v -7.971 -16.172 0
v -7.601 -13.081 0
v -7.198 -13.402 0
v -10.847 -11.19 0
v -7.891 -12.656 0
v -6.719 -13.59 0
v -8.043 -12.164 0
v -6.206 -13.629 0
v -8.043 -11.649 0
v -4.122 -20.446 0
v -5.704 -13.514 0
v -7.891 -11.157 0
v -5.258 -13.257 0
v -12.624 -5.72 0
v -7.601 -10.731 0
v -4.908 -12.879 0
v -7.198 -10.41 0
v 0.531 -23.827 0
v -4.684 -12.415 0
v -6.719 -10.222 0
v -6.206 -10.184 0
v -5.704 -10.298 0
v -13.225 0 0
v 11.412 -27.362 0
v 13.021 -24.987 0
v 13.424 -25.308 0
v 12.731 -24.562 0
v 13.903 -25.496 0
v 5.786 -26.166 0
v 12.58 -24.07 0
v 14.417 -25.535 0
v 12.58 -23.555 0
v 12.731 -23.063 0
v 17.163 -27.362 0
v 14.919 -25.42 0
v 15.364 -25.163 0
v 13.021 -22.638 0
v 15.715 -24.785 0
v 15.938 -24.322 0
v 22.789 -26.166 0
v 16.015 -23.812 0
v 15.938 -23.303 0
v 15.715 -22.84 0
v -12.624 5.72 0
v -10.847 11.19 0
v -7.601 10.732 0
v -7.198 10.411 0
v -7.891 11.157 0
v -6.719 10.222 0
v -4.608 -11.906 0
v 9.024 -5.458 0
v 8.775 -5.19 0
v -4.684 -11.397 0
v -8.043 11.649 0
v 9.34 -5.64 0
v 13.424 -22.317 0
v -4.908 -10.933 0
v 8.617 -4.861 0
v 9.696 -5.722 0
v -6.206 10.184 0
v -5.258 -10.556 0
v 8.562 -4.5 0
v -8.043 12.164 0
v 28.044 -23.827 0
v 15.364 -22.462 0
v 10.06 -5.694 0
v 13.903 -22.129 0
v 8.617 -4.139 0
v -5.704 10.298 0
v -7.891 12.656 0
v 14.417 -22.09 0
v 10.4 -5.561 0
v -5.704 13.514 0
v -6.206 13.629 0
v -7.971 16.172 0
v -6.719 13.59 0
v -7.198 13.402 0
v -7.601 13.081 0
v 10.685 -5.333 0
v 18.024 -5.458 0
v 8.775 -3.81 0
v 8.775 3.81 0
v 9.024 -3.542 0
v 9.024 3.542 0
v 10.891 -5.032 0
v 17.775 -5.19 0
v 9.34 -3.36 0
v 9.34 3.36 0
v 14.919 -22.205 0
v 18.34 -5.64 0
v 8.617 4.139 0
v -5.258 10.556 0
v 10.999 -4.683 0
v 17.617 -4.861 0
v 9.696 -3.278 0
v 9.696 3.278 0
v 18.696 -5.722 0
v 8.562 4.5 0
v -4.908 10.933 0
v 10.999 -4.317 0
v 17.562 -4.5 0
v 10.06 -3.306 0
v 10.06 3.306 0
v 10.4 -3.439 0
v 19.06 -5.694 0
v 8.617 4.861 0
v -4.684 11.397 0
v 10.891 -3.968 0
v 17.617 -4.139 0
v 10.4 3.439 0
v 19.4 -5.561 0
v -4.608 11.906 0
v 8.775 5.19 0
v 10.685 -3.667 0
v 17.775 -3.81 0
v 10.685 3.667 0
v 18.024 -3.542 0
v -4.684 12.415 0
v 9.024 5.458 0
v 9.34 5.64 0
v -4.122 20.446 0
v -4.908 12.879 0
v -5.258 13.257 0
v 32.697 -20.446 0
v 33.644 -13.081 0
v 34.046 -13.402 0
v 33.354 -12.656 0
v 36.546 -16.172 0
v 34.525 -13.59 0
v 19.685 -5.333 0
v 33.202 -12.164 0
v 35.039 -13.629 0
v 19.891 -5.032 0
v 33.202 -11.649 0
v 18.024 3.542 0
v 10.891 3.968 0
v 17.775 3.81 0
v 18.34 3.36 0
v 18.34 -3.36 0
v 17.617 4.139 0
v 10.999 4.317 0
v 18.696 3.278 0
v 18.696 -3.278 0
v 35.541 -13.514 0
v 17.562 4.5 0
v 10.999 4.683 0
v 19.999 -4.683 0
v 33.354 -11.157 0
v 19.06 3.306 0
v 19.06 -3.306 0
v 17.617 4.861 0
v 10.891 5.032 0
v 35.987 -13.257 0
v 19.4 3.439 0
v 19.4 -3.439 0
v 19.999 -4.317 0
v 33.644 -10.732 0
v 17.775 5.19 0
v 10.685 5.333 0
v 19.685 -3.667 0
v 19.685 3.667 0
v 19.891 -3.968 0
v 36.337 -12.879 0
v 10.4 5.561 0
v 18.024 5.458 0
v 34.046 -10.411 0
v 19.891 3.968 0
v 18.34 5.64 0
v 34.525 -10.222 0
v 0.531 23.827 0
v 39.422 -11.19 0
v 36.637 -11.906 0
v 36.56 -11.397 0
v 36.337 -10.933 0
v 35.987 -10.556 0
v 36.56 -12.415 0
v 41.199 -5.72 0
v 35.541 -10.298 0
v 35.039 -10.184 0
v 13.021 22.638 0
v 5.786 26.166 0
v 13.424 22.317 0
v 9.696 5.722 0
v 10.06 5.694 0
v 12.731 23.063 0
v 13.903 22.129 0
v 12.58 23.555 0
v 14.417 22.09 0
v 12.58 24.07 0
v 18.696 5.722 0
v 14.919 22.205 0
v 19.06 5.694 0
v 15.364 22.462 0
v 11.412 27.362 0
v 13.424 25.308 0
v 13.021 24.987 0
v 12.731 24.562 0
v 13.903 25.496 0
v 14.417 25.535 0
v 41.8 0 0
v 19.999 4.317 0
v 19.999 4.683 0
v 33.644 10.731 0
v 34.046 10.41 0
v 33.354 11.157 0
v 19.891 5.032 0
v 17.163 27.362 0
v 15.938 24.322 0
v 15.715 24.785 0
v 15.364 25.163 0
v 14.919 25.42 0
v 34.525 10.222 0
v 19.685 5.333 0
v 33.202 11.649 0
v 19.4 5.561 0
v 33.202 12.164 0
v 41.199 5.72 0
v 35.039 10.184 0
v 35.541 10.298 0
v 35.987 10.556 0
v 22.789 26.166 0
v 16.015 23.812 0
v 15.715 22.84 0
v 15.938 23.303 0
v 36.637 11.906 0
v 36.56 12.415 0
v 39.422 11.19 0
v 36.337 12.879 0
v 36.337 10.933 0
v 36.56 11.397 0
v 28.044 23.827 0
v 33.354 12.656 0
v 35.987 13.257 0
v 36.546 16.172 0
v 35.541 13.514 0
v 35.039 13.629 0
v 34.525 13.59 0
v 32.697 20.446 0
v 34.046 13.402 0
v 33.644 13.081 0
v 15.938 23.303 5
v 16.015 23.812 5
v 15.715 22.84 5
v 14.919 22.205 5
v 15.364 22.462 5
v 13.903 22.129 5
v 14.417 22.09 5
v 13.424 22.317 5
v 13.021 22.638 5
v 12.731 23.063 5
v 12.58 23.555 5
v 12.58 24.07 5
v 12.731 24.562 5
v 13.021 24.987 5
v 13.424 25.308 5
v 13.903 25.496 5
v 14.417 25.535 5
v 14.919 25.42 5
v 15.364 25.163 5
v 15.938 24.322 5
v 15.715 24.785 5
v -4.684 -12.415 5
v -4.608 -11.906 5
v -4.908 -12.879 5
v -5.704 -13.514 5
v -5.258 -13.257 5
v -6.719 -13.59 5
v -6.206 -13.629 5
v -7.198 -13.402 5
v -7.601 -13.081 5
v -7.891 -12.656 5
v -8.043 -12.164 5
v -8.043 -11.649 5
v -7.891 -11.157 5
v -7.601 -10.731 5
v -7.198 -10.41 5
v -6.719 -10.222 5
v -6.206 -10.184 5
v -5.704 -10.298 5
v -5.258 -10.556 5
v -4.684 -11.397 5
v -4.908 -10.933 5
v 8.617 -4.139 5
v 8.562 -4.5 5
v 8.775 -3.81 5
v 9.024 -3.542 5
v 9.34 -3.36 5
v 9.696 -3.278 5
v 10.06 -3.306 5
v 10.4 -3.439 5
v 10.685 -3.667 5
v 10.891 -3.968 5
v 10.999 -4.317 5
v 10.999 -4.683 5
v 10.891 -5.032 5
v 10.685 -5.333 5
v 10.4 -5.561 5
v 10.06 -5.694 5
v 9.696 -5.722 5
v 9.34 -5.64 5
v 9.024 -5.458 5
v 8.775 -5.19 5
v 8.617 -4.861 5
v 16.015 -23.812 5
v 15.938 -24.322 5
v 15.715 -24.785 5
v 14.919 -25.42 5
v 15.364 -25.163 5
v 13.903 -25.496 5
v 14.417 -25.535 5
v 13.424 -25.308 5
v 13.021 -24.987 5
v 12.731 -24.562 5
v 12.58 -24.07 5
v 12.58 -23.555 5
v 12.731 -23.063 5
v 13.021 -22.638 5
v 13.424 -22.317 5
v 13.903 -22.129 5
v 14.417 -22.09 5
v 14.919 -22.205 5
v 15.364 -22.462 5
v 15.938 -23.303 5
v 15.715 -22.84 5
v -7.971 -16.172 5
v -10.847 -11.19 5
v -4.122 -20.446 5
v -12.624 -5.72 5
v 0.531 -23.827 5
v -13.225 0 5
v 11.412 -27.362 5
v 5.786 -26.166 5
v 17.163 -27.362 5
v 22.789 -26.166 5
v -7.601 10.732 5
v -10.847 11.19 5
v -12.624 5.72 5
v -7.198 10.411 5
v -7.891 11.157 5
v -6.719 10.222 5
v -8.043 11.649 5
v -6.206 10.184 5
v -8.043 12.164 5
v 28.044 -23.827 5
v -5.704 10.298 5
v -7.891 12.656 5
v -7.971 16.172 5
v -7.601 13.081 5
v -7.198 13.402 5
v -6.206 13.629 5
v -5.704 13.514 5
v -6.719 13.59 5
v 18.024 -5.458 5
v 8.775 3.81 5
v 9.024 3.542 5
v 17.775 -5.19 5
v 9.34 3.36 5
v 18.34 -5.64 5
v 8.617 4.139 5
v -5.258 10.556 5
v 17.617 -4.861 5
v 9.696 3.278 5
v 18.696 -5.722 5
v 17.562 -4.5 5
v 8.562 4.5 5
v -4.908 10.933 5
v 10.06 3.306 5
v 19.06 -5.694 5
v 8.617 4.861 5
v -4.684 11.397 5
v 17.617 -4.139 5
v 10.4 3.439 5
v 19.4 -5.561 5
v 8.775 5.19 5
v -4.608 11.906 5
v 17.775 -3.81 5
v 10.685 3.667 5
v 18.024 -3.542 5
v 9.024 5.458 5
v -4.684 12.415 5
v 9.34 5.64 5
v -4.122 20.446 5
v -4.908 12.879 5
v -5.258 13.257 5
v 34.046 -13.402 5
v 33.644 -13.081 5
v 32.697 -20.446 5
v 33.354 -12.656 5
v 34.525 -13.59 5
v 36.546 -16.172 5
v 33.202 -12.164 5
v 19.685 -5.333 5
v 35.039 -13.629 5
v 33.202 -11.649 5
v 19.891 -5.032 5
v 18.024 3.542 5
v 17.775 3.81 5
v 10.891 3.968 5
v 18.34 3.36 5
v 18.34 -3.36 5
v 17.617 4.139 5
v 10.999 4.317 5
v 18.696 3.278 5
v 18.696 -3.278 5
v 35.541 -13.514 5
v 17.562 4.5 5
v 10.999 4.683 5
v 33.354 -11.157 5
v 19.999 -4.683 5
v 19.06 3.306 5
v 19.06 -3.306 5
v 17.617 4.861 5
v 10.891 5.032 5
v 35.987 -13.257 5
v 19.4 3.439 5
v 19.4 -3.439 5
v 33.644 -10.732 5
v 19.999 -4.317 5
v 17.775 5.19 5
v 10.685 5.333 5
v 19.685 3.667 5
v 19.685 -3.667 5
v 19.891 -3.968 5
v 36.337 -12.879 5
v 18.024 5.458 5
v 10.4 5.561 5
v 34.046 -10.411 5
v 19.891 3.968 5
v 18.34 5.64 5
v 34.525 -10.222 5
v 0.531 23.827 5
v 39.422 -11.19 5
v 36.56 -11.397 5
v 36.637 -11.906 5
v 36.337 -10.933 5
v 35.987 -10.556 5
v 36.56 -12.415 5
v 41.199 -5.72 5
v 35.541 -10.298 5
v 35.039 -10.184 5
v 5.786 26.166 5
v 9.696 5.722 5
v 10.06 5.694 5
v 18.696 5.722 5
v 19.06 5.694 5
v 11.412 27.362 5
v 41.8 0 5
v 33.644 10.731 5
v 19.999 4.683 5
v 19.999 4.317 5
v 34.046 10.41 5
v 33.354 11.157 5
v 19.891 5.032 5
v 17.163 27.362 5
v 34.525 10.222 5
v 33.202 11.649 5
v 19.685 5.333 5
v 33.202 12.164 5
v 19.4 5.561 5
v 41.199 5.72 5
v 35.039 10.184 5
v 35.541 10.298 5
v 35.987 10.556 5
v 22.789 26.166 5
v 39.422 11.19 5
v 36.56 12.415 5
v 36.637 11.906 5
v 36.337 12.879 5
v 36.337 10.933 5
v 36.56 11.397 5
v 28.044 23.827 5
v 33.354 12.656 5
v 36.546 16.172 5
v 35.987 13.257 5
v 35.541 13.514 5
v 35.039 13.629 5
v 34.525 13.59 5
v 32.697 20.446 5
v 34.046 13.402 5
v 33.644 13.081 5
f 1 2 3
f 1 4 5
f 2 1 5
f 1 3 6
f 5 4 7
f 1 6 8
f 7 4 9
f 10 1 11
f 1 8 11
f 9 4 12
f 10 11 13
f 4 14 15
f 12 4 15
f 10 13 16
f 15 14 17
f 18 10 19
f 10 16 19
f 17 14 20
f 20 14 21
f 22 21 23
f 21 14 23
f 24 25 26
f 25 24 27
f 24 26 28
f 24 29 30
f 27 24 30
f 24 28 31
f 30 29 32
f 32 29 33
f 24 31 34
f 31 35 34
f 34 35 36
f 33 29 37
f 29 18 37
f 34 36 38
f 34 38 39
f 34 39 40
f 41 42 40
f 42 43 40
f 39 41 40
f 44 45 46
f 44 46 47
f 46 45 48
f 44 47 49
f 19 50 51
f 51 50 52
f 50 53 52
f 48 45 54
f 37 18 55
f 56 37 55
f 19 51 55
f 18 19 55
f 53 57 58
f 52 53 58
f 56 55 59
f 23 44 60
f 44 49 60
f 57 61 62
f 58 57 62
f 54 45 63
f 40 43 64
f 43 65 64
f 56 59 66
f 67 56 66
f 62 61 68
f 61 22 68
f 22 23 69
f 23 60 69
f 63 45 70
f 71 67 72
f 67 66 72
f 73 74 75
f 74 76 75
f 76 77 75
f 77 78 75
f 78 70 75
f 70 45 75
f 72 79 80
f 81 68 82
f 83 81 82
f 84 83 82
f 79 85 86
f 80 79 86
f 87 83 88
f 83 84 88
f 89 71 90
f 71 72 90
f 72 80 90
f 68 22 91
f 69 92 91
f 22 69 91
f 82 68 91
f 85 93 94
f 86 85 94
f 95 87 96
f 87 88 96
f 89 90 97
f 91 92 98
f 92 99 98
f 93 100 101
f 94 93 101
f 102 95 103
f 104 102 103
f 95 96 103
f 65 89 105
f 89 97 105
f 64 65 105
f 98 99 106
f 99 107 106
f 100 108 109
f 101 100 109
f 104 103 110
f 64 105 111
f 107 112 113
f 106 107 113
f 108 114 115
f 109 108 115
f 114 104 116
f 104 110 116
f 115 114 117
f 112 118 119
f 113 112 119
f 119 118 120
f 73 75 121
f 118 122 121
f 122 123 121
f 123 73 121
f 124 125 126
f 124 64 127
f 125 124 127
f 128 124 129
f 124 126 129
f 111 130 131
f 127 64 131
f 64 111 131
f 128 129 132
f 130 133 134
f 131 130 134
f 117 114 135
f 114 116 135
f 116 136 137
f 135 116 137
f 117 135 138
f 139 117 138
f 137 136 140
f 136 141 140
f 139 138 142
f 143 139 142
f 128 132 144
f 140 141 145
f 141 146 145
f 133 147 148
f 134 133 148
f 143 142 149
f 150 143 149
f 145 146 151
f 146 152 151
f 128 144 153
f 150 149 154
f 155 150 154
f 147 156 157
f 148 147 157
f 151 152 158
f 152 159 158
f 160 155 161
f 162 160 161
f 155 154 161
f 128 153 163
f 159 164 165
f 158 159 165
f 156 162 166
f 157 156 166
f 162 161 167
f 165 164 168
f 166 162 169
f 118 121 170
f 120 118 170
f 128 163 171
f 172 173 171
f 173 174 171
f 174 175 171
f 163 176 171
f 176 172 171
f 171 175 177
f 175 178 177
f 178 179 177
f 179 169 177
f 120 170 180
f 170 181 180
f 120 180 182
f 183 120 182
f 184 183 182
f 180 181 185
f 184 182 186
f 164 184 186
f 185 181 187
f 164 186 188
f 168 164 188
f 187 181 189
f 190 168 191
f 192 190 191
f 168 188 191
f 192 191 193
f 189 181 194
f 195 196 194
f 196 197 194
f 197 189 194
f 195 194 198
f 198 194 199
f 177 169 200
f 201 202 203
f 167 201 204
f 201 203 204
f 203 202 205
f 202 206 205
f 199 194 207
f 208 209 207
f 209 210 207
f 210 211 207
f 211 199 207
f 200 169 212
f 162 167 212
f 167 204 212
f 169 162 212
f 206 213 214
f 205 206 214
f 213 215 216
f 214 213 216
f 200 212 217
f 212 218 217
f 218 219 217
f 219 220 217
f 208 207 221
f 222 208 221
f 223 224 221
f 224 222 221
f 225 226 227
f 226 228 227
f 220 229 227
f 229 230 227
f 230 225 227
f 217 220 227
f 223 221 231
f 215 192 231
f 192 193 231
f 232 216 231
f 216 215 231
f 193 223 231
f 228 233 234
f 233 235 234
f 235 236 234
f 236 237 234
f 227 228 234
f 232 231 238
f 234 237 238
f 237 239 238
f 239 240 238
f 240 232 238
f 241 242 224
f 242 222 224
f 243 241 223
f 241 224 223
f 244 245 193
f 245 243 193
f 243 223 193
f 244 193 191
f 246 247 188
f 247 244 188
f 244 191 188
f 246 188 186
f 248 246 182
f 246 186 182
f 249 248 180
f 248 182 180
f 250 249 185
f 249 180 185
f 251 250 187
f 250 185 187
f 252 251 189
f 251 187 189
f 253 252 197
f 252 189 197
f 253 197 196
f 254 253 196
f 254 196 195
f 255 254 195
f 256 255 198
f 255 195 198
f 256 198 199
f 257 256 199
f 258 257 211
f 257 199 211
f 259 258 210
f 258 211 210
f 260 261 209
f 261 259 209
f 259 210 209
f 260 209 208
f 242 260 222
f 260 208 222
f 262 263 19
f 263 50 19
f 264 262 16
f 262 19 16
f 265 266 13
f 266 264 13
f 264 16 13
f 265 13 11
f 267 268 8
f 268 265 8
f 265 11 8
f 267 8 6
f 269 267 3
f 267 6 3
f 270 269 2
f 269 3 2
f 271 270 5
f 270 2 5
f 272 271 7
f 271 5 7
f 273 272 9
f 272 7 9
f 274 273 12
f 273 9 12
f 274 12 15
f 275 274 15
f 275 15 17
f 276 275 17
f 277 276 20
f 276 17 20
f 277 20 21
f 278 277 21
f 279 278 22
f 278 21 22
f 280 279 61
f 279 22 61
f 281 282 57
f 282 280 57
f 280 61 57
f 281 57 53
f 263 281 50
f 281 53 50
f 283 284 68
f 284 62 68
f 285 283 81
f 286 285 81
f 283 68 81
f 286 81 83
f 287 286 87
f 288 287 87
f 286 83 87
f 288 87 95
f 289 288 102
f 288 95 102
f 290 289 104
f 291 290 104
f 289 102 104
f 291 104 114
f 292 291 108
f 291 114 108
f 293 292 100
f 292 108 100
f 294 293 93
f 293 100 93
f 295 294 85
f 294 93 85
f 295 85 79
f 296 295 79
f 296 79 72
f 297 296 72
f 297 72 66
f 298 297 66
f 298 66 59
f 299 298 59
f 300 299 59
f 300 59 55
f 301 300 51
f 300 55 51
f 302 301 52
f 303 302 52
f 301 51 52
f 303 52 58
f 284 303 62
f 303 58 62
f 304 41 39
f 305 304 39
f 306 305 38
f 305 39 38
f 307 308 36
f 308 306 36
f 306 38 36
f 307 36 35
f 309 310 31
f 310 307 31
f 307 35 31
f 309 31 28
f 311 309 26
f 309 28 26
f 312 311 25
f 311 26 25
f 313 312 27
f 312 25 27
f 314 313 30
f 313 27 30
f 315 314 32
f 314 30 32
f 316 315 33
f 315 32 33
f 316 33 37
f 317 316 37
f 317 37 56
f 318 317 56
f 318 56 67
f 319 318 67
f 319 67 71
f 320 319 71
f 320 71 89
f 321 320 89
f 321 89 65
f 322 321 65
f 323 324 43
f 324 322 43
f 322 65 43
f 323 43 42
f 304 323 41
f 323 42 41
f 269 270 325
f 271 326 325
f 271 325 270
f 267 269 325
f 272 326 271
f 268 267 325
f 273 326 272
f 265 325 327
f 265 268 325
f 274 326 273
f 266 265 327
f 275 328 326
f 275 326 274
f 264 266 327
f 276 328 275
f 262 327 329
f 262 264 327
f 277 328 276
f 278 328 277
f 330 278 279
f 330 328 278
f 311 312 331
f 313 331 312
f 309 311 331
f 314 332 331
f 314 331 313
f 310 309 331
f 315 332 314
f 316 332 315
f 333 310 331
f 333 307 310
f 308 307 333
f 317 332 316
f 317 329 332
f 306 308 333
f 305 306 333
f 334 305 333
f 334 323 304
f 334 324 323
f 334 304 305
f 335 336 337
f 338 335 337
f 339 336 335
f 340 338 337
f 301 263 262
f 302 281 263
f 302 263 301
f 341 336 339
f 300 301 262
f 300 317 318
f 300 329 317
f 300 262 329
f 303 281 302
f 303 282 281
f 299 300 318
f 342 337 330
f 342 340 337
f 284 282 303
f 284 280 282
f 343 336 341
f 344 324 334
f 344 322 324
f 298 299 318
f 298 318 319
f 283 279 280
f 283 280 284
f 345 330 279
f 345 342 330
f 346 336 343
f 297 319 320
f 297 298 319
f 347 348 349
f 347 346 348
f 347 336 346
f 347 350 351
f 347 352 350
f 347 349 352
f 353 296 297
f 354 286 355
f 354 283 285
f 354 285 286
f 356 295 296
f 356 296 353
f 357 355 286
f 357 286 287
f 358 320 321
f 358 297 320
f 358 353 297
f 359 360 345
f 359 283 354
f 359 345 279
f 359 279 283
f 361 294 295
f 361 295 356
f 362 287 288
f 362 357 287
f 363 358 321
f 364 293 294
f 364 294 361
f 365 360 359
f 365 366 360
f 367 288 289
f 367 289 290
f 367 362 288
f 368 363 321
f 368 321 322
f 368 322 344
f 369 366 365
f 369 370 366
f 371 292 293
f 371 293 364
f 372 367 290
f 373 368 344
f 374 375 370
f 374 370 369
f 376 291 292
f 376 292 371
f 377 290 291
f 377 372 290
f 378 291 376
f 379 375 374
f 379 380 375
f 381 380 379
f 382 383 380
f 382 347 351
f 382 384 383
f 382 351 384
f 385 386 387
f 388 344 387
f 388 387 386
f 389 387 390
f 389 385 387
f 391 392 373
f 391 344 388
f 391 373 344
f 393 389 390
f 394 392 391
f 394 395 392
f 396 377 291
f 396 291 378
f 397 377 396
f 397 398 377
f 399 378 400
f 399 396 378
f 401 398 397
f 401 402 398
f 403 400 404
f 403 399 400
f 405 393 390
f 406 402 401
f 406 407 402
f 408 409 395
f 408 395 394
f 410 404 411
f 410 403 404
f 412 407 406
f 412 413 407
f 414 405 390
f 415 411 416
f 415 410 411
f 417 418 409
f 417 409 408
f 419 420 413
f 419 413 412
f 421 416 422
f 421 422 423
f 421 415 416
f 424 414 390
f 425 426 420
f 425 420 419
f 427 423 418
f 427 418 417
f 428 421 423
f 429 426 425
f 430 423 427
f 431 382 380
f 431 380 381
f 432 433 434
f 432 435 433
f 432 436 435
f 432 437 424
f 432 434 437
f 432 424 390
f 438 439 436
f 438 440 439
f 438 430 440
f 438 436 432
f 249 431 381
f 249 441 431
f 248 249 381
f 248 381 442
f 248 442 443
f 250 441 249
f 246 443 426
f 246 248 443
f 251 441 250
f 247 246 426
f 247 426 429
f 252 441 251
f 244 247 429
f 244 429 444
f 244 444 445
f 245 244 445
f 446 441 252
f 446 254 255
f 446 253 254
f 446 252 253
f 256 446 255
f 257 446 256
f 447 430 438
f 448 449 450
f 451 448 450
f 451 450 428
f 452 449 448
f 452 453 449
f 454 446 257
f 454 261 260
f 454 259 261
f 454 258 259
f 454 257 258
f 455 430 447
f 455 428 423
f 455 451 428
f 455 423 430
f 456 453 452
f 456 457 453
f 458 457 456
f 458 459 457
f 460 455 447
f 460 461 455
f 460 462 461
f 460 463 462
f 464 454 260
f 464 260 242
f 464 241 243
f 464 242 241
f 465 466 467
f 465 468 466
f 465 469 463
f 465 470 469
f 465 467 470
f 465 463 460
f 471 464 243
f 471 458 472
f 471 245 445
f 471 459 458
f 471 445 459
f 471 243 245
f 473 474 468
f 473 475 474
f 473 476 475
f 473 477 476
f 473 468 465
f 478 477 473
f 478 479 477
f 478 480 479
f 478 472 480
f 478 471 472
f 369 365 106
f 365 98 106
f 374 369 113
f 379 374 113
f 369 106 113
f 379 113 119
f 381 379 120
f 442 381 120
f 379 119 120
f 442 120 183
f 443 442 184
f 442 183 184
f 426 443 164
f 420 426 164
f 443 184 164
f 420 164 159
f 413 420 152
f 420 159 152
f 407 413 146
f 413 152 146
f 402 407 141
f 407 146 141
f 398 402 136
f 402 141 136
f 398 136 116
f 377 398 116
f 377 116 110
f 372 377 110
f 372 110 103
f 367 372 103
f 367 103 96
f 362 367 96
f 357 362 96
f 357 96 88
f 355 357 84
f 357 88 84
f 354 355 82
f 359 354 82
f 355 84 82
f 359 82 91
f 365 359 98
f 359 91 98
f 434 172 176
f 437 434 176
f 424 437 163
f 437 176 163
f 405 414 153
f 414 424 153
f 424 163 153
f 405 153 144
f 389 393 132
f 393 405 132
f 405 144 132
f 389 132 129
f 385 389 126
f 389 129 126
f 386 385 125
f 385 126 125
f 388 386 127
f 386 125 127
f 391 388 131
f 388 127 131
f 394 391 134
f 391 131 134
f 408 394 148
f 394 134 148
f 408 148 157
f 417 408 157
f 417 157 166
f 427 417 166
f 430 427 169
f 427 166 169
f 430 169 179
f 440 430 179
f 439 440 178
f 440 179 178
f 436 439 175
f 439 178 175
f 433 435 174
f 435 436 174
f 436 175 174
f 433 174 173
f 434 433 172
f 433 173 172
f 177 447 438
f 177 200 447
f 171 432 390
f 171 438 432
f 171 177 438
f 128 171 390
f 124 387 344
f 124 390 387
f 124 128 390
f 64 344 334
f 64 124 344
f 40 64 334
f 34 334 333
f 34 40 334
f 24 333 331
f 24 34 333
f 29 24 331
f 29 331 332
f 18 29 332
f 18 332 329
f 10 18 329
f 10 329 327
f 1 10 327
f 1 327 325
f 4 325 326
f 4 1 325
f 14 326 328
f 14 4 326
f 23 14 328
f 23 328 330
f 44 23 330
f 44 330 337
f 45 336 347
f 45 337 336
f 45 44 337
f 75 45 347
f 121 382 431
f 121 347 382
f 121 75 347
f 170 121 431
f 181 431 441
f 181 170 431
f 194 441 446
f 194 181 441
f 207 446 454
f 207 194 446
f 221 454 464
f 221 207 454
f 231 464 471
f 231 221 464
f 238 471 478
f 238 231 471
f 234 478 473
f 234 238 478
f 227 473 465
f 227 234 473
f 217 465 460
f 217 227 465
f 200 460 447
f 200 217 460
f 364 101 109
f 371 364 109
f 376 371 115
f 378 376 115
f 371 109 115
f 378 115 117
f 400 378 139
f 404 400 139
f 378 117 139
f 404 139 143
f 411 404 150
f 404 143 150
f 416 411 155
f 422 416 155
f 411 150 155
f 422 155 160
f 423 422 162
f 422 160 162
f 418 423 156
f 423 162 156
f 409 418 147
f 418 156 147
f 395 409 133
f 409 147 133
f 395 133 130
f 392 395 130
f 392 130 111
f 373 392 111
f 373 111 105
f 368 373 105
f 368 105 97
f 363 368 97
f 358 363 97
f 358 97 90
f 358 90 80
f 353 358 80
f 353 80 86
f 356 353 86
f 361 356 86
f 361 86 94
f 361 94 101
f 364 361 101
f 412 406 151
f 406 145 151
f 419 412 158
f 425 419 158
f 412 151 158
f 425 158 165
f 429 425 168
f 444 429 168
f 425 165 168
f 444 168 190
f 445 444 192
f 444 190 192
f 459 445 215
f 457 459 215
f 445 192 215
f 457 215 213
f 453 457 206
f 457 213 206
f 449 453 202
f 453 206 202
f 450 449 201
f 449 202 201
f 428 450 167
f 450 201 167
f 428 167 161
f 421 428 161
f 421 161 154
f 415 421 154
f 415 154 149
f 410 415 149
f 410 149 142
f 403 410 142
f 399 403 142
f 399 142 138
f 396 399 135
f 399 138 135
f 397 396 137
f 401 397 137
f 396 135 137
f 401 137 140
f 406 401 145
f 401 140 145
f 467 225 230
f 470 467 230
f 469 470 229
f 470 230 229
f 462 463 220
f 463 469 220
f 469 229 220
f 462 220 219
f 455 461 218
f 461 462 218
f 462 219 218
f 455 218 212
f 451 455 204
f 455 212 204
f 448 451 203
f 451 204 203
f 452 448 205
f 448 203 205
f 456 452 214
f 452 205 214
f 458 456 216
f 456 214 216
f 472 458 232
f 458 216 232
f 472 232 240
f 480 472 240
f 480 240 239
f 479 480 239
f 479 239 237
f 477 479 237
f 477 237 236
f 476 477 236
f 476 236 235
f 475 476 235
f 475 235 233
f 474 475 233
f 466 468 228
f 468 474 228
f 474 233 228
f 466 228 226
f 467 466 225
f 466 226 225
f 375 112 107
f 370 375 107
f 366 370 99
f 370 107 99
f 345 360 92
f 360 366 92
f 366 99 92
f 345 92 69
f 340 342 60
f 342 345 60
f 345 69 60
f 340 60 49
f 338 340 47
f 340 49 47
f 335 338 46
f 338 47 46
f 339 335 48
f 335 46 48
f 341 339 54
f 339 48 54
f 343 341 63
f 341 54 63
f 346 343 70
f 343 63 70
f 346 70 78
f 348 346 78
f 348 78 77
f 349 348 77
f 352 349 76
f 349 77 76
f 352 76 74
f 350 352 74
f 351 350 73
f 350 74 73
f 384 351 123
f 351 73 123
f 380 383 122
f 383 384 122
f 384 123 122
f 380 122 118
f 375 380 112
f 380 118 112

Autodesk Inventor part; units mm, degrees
ref_plane "YZ Plane" through (0, 0, 0) normal (1, 0, 0) x (0, 1, 0)
ref_plane "XZ Plane" through (0, 0, 0) normal (0, 1, 0) x (-1, 0, 0)
ref_plane "XY Plane" through (0, 0, 0) normal (0, 0, 1) x (1, 0, 0)
sketch "Base" plane through (0, 0, 0) normal (0, 0, 1) x (1, 0, 0)
  circle A0 centre (14.2875, 0) radius 14.2875 construction
  circle A1 centre (34.9097, 11.9062) radius 1.9939 construction
  circle A2 centre (34.9097, -11.9063) radius 1.9939 construction
  circle A3 centre (14.2875, -23.8125) radius 1.9939 construction
  circle A4 centre (-6.3347, -11.9062) radius 1.9939 construction
  circle A5 centre (-6.3347, 11.9063) radius 1.9939 construction
  circle A6 centre (14.2875, 23.8125) radius 1.9939 construction
  circle A7 centre (14.2875, 0) radius 27.5127
  arc A8 (34.1709, -15.825) -> (37.934, -9.307) centre (34.9097, -11.9063) ccw construction
  circle A9 centre (-6.3347, 11.9063) radius 1.7272
  circle A10 centre (14.2875, 23.8125) radius 1.7272
  circle A11 centre (34.9097, 11.9062) radius 1.7272
  circle A12 centre (34.9097, -11.9063) radius 1.7272
  circle A13 centre (14.2875, -23.8125) radius 1.7272
  circle A14 centre (-6.3347, -11.9062) radius 1.7272
  point P0 (0, 0)
  dimension "d3" = 55.0254
  dimension "d10" = 3.4544
extrude "Plate1" add sketch "Base" along normal blind 5
sketch "WheelMagnetAlignmentFlangeMountHoles" plane through (14.2875, 0, 0) normal (0, 0, -1) x (-1, 0, 0)
  circle A0 centre (4.5, 4.5) radius 1.225 projected
  circle A1 centre (4.5, -4.5) radius 1.225 projected
  circle A2 centre (-4.5, -4.5) radius 1.225 projected
  circle A3 centre (-4.5, 4.5) radius 1.225 projected
  point P0 (14.2875, 0)
extrude "Cut1" cut sketch "WheelMagnetAlignmentFlangeMountHoles" against normal blind 5
equation "\"d45\" = Thickness"
equation "\"d44\" = Thickness"
equation "\"BendRadius\" = Thickness"
equation "\"BendReliefWidth\" = Thickness"
equation "\"BendReliefDepth\" = 0.5 * Thickness"
equation "\"TransitionRadius\" = BendRadius"
equation "\"JacobiRadiusSize\" = BendRadius"
equation "\"GapSize\" = Thickness"
equation "\"Thickness\" = 5"
properties part number "LegEncoderHub"
